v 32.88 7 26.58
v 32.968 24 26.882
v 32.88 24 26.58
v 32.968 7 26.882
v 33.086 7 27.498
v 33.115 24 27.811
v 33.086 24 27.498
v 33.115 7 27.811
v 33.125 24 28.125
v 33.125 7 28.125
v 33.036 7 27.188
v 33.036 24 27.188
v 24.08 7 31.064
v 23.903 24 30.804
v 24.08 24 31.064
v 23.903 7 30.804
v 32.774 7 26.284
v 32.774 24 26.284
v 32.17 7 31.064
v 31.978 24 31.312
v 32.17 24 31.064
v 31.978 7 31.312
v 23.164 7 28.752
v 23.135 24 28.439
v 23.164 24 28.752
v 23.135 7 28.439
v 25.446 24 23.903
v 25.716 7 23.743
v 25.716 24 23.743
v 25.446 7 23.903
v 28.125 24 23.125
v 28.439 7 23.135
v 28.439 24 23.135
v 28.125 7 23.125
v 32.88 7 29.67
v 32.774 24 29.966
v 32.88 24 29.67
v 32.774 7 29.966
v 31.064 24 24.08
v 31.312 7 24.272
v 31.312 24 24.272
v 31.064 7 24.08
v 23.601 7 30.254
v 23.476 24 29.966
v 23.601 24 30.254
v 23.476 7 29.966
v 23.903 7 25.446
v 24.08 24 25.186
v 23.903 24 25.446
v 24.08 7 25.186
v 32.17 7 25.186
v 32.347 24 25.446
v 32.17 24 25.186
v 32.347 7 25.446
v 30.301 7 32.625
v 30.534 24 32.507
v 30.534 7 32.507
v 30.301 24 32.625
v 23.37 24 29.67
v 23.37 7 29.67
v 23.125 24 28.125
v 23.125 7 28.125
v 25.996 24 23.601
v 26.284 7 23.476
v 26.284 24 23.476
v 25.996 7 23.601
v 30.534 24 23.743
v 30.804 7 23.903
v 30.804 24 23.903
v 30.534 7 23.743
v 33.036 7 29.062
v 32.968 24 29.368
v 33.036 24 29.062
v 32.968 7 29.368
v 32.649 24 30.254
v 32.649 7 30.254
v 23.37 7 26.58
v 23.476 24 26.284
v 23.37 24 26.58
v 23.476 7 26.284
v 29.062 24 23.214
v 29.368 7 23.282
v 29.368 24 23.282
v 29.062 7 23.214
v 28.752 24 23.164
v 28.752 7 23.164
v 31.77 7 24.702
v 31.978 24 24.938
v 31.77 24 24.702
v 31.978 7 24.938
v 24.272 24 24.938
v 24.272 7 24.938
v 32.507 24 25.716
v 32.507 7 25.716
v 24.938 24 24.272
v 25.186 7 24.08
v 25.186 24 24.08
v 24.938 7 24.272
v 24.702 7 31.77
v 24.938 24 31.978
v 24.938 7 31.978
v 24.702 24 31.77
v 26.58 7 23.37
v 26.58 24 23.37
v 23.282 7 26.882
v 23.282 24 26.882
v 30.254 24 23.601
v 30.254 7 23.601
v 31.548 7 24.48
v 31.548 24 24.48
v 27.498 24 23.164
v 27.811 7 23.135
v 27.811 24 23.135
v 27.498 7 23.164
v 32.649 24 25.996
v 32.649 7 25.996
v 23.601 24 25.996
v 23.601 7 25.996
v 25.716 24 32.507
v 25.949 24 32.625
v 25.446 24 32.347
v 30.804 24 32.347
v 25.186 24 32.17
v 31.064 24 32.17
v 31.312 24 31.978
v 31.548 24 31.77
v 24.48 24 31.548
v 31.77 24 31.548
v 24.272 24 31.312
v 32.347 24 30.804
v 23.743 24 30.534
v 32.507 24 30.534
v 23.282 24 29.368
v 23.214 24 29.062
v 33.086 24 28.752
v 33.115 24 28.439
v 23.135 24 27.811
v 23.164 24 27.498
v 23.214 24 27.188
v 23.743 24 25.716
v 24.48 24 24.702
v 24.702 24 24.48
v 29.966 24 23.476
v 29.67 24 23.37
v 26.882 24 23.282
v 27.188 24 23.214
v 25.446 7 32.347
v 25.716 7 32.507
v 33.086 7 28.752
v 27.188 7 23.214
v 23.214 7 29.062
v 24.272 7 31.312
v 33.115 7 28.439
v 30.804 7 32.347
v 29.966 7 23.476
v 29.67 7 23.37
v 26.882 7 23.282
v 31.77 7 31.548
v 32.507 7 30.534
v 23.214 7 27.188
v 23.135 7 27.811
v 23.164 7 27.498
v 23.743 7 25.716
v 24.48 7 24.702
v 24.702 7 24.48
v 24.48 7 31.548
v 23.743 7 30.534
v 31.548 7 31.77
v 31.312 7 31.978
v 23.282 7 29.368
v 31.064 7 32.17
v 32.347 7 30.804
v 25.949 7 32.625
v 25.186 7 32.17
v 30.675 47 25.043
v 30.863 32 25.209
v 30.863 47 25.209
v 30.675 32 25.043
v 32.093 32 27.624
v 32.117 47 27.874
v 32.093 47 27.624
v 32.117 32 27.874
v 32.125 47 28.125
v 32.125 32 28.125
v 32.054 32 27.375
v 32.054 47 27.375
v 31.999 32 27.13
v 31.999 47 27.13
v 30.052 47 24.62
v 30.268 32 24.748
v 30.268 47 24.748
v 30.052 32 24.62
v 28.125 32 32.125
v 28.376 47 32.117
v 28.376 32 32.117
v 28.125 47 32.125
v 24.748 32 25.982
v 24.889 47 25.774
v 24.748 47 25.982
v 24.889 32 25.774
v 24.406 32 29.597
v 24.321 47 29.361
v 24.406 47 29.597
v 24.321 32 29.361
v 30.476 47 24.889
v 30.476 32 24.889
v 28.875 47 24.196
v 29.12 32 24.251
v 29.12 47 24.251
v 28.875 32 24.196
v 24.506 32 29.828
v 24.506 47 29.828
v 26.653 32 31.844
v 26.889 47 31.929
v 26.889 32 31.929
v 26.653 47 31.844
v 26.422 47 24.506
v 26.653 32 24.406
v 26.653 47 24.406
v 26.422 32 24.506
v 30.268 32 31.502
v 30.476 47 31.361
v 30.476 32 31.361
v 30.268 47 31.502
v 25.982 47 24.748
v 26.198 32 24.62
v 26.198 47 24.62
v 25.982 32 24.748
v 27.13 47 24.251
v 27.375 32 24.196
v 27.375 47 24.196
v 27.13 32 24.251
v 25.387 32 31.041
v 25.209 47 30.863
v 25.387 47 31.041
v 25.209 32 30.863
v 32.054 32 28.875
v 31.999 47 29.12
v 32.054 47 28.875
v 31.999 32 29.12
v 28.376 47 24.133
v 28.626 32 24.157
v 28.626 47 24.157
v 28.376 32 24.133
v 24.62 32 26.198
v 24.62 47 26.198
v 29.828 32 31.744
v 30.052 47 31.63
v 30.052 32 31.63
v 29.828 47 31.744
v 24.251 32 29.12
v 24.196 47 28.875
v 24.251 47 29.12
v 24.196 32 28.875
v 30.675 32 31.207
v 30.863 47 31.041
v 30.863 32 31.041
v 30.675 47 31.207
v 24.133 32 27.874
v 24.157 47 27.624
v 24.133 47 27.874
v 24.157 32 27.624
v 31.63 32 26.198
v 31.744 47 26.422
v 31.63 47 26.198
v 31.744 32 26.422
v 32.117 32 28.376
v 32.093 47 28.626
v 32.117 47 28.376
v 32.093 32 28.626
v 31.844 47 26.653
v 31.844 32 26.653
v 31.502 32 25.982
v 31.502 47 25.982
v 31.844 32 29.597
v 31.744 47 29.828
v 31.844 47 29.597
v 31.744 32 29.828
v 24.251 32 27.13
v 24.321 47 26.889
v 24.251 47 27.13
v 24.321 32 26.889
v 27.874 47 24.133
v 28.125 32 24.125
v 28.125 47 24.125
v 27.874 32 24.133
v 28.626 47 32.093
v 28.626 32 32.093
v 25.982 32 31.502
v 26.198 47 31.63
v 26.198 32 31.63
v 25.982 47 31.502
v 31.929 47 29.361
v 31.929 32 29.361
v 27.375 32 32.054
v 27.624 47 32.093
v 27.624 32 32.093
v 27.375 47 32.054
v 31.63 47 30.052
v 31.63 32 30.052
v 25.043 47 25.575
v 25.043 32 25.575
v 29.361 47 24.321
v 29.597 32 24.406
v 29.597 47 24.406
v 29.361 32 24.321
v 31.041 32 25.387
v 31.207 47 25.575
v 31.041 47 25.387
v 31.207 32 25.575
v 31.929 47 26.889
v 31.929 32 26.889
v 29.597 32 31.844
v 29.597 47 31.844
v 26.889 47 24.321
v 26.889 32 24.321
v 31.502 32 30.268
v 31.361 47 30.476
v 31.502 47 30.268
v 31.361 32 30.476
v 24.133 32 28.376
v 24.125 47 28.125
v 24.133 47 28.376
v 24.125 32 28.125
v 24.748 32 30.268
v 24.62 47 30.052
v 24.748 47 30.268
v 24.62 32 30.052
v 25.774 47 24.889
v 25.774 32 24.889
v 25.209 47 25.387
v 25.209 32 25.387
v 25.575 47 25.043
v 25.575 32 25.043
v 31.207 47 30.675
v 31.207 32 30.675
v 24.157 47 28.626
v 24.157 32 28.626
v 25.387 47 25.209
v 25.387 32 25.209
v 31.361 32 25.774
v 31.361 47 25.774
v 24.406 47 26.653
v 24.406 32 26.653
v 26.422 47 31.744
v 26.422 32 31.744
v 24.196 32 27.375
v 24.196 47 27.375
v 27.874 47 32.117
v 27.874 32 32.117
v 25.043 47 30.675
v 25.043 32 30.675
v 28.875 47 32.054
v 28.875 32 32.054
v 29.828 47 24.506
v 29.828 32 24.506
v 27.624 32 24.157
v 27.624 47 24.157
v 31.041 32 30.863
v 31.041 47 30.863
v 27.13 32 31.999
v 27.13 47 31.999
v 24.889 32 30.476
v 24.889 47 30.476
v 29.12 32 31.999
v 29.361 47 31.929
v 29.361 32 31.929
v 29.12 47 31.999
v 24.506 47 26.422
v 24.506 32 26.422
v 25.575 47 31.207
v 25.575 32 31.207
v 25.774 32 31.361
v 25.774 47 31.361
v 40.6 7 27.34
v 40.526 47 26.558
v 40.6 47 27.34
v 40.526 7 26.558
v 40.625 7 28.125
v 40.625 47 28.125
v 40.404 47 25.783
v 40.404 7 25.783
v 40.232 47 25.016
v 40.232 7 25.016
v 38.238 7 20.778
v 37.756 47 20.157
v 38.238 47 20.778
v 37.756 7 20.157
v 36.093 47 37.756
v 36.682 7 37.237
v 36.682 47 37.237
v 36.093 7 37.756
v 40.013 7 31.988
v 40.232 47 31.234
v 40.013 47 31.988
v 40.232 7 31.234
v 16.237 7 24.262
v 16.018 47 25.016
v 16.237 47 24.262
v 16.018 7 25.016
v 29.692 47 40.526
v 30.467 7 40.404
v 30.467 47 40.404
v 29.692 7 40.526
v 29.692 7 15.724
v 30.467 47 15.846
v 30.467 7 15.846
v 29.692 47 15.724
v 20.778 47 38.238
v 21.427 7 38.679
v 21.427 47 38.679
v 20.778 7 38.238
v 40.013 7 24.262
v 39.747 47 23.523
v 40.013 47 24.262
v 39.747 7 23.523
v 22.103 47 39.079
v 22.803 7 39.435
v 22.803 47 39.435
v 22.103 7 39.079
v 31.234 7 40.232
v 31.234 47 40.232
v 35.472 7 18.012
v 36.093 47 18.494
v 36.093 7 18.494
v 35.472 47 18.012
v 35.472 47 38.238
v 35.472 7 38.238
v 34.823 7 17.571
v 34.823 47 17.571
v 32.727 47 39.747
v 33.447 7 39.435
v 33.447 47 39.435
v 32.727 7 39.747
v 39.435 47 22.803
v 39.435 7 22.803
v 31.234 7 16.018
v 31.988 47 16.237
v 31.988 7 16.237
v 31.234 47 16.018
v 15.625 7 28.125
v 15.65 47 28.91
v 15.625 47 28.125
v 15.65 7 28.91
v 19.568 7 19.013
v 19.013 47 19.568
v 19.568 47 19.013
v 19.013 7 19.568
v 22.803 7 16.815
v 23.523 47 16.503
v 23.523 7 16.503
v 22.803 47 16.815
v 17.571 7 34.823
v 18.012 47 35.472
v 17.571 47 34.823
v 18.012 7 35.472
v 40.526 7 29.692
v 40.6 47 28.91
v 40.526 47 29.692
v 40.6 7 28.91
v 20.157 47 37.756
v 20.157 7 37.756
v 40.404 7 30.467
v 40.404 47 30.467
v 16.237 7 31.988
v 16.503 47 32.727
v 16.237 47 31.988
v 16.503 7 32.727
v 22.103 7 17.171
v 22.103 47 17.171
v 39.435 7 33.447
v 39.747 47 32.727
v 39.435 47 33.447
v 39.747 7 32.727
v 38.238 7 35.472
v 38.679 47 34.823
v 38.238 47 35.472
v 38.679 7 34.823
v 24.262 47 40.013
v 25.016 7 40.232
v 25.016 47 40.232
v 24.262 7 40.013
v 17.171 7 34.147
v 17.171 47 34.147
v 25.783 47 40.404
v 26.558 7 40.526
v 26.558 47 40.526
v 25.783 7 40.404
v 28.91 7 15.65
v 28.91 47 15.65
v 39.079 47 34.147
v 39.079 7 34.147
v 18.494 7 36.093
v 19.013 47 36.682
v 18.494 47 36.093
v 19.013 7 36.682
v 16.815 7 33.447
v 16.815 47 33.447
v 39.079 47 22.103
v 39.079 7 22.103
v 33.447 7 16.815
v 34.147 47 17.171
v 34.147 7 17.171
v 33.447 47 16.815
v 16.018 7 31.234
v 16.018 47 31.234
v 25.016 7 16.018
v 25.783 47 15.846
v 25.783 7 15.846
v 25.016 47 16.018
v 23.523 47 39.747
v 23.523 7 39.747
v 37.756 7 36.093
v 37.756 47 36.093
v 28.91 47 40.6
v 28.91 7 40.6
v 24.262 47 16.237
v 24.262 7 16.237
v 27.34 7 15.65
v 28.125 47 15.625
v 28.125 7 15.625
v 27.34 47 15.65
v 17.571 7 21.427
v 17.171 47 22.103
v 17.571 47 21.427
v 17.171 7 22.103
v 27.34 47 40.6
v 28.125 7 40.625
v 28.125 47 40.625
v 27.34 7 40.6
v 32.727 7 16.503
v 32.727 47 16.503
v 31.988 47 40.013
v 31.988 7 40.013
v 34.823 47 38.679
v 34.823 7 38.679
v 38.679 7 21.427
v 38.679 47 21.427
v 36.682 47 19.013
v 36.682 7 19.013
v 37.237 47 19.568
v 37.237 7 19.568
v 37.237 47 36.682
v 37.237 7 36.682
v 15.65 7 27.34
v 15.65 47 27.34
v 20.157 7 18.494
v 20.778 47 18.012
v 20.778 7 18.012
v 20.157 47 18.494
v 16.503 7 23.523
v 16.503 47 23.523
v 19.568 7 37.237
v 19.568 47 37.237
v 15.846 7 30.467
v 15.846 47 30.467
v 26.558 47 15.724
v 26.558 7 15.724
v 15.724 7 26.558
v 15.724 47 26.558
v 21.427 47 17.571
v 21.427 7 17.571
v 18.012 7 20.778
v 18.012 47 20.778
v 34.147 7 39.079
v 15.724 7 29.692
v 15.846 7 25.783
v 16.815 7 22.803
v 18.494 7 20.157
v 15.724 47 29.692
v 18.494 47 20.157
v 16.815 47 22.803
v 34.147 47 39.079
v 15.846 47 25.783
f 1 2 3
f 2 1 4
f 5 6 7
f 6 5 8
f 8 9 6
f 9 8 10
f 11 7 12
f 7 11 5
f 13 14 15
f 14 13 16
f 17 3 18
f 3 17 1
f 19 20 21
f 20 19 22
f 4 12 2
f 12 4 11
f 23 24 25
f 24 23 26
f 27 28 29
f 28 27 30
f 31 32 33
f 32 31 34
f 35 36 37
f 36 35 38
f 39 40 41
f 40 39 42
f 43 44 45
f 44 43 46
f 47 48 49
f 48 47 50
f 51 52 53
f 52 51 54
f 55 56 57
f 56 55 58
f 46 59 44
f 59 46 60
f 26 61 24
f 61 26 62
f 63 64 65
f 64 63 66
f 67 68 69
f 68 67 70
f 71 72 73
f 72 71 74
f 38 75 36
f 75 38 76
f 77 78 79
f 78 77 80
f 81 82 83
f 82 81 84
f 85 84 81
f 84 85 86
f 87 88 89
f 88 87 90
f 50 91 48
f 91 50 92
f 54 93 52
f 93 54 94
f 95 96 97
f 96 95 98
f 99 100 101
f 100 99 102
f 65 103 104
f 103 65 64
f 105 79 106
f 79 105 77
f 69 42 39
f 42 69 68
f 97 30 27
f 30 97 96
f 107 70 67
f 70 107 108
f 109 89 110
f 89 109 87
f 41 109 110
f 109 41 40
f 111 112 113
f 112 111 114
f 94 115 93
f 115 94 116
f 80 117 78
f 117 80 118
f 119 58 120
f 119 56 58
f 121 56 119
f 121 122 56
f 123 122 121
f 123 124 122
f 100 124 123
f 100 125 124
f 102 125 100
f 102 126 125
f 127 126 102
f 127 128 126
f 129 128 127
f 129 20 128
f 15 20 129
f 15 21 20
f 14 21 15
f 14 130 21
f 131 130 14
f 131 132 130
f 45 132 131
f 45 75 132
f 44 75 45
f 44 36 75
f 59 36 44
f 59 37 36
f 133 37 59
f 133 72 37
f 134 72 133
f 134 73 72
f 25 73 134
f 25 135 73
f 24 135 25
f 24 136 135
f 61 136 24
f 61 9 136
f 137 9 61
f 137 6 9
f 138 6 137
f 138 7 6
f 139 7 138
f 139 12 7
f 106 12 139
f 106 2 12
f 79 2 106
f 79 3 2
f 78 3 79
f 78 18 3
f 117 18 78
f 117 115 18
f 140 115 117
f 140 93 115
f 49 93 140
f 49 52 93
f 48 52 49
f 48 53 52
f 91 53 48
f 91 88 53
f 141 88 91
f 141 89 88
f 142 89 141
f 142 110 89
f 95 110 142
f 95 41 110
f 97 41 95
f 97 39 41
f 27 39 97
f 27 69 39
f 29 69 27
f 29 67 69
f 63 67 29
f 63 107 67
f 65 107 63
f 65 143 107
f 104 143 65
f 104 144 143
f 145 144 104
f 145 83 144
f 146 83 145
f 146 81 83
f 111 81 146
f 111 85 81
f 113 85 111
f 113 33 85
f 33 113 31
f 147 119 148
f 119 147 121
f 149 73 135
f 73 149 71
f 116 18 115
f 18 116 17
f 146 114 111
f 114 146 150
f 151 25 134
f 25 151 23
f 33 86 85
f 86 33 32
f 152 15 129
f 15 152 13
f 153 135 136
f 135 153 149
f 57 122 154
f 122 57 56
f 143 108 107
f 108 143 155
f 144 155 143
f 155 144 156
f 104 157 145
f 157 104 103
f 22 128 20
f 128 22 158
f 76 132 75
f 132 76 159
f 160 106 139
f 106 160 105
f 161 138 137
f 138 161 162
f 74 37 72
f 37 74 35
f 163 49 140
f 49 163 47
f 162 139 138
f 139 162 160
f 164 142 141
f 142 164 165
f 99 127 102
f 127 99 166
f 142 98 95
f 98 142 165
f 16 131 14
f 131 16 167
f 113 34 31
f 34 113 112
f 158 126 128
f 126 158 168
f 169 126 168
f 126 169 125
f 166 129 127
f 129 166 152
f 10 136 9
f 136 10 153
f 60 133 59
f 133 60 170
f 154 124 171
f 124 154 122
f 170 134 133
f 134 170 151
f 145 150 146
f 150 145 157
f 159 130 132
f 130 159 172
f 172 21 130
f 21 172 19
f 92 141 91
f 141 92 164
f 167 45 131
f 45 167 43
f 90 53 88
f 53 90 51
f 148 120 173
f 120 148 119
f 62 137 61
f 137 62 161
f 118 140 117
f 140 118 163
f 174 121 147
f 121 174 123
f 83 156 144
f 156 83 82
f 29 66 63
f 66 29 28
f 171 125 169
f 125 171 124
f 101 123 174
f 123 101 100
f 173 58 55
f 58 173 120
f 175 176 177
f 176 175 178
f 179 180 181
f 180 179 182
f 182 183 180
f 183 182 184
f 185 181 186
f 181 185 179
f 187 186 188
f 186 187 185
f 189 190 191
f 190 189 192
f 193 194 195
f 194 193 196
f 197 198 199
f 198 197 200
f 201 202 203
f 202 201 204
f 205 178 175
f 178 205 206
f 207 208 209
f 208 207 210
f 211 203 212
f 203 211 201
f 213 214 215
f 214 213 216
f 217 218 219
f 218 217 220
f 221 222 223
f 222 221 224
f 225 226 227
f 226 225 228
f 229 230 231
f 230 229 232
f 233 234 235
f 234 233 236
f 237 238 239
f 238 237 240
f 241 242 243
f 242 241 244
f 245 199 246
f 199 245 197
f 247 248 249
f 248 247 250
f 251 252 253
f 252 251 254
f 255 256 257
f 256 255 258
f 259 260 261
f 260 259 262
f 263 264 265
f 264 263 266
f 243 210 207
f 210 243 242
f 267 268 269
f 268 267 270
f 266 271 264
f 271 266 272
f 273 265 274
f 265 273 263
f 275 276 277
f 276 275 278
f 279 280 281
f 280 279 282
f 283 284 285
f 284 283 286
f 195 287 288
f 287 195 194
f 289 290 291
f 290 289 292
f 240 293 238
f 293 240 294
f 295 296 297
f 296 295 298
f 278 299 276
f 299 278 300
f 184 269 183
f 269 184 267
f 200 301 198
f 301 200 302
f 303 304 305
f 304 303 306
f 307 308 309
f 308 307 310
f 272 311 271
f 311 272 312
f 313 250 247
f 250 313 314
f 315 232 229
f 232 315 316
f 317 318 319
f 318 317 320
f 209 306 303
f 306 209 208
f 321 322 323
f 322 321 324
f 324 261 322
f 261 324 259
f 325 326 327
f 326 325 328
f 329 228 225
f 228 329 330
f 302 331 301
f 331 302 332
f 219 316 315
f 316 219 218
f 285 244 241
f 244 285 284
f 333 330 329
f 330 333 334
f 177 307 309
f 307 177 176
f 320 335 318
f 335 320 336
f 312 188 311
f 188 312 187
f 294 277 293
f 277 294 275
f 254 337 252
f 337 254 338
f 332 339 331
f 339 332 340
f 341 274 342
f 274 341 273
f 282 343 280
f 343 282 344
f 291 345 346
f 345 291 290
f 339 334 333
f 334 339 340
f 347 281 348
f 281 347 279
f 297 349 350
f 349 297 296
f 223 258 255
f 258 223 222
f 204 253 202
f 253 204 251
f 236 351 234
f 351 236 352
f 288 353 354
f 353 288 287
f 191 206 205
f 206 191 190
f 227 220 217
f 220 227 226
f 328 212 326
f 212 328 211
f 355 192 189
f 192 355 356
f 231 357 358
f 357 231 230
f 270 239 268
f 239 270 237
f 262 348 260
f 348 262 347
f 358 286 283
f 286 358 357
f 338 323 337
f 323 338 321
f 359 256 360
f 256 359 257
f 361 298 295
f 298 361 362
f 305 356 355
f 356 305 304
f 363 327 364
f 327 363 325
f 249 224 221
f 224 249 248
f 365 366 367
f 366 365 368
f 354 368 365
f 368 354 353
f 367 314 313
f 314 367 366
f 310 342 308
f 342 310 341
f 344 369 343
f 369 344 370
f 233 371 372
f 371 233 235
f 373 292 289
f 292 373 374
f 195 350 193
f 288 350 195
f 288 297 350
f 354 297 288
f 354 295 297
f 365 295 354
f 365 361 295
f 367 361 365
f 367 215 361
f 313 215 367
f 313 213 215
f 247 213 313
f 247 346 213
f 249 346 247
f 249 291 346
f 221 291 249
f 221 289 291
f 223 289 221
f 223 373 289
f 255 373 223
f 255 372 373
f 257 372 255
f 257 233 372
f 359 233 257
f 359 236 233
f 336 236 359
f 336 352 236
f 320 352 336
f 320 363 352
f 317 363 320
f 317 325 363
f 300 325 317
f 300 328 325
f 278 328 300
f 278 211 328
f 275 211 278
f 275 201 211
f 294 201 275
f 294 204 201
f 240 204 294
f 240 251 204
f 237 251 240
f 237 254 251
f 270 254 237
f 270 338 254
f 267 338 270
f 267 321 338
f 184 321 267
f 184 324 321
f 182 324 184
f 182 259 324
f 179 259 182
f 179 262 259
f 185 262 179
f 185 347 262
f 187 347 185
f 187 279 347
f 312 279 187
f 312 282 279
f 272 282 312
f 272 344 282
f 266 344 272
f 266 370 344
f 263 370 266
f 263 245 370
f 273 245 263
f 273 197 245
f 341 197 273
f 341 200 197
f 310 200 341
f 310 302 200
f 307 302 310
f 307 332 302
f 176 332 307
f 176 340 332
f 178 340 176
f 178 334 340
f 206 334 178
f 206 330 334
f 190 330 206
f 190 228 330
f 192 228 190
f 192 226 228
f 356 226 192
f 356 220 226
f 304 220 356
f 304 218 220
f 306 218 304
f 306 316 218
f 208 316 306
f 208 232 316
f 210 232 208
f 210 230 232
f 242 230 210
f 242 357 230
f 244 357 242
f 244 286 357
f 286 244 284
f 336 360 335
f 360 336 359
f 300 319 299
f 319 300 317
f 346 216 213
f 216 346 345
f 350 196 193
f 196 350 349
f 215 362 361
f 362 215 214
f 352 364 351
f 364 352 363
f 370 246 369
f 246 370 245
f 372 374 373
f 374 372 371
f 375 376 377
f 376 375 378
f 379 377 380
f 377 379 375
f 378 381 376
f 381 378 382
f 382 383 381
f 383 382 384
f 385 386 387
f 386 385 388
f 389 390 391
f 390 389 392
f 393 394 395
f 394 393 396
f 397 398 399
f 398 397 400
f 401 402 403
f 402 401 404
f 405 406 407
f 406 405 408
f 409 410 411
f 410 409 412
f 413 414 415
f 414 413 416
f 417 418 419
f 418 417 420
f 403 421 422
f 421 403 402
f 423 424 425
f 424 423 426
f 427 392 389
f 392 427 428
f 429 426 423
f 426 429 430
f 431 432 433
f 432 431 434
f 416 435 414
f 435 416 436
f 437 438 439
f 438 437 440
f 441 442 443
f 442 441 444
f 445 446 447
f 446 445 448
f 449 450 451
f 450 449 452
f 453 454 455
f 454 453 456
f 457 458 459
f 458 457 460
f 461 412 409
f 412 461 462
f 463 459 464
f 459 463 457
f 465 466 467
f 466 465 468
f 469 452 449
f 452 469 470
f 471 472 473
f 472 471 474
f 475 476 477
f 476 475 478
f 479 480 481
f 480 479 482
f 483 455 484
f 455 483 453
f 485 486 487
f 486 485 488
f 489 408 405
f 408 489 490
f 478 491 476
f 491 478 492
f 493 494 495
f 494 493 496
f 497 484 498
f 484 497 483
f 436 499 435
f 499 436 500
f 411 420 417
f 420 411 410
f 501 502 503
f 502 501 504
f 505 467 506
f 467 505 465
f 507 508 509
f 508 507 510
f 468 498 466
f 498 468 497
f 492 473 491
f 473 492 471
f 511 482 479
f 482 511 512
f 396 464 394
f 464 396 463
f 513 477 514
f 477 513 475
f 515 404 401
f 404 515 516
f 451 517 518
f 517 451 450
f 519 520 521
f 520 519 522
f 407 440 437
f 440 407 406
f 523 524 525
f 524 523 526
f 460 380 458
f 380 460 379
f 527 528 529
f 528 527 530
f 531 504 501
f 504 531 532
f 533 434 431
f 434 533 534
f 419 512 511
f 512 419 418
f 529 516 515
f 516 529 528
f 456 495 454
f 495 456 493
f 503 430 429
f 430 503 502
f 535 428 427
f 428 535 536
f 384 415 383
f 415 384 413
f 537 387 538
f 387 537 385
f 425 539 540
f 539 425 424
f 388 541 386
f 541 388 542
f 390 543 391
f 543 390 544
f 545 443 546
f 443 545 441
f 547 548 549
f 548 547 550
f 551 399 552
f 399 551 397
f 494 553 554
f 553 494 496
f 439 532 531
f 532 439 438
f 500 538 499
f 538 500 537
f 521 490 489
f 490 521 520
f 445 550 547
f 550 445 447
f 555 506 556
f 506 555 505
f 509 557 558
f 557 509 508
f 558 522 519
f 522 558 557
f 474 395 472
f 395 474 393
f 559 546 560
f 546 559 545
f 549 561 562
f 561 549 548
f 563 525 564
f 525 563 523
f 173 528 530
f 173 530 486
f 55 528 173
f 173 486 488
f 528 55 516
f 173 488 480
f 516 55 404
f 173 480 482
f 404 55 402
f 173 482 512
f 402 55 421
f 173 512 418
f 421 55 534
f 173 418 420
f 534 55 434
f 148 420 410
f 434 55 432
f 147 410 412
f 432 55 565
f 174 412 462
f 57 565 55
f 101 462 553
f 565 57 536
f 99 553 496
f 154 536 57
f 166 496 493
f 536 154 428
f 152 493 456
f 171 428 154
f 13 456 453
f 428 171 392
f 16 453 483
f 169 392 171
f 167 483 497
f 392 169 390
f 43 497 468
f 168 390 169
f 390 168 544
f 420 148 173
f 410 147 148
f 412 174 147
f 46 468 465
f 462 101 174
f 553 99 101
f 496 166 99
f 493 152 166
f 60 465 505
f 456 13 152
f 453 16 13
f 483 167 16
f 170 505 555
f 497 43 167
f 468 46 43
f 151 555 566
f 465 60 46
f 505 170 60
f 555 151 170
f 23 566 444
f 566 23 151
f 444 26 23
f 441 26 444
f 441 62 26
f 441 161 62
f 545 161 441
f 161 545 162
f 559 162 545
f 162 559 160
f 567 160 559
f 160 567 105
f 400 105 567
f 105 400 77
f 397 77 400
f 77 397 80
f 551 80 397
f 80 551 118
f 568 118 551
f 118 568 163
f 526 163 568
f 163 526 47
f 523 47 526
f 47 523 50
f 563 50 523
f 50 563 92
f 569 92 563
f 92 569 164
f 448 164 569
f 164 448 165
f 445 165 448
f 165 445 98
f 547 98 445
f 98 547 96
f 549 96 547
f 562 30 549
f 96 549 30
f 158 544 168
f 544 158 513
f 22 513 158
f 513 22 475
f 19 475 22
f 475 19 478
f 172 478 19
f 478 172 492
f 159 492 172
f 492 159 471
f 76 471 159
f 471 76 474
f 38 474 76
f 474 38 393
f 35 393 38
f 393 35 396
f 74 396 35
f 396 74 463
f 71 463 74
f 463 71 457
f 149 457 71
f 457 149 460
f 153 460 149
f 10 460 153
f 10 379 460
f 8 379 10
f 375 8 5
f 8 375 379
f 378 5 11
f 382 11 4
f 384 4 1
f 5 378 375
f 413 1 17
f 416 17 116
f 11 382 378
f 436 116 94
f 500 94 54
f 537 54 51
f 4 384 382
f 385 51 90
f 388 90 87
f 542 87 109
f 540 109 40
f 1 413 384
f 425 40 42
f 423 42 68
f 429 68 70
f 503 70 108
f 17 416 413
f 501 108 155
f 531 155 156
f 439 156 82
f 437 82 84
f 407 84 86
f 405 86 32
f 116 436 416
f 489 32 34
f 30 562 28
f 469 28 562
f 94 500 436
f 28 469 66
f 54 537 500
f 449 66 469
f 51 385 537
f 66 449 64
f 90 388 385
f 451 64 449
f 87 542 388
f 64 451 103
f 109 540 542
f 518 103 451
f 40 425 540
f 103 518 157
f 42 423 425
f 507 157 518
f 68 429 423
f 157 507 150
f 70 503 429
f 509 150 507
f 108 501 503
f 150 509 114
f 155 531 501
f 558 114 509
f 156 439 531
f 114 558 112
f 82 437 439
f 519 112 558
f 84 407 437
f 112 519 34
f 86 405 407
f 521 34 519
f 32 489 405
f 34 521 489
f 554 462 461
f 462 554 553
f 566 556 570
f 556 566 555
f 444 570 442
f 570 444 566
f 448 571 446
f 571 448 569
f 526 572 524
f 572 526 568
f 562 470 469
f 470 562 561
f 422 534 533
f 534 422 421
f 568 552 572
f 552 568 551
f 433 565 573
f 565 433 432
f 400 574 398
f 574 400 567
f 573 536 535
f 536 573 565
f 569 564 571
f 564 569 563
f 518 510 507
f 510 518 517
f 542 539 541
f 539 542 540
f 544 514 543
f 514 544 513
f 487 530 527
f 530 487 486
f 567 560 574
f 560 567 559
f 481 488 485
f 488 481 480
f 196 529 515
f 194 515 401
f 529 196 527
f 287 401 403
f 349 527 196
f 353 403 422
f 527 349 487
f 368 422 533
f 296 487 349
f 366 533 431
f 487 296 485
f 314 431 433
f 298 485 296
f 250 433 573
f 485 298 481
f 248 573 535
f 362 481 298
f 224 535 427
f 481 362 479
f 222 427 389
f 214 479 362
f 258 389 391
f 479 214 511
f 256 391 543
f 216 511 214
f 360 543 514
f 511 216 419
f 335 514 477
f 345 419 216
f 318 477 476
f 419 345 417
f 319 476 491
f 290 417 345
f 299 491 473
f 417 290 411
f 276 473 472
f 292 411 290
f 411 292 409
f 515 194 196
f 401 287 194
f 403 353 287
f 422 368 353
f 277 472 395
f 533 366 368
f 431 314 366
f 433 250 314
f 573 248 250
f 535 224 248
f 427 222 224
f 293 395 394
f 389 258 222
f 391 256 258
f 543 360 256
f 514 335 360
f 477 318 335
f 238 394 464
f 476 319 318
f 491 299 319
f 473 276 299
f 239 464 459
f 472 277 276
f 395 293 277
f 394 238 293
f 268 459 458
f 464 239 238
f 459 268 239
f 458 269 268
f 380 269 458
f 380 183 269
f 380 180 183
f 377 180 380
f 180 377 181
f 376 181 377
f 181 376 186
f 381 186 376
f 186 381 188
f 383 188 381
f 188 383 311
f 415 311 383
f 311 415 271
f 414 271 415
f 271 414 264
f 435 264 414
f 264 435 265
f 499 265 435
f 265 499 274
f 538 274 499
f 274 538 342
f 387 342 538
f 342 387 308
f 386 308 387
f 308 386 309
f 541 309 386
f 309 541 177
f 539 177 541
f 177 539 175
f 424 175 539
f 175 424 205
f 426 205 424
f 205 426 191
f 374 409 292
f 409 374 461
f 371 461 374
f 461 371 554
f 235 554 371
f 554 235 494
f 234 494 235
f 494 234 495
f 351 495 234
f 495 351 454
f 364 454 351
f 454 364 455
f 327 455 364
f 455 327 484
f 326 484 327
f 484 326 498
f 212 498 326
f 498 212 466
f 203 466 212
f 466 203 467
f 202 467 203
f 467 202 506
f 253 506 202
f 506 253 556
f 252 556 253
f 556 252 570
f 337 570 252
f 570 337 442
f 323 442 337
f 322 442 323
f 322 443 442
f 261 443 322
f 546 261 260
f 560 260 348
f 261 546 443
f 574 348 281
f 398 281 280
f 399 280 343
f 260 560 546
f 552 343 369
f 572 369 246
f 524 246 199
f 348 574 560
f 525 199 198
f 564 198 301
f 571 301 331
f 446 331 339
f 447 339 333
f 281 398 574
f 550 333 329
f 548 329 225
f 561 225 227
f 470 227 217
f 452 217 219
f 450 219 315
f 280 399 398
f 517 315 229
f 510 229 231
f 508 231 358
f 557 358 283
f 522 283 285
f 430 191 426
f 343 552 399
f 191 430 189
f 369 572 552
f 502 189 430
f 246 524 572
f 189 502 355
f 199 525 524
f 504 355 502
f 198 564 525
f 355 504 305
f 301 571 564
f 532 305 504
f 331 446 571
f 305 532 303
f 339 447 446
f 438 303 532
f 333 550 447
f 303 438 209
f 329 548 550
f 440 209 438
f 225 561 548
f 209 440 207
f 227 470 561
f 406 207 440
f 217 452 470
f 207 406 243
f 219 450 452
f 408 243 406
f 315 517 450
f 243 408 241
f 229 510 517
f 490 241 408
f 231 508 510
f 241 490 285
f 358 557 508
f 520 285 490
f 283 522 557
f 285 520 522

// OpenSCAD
// file: ../helper/motor.scad
include <../helper/bom.scad>

/*
  Author: Johannes Bayer, 2025
  License: MIT
  Description: NEMA 23 Stepper Motor
*/


MOTOR_BLOCK_WIDTH = 56.25;
MOTOR_BLOCK_HEIGHT = 56.25;
MOTOR_BLOCK_LENGTH = 112.0;
MOTOR_CON_DIA = 38.1;
MOTOR_CON_LEN = 1.5;
MOTOR_SHAFT_DIA = 10;
MOTOR_SHAFT_LEN = 22.5;
MOTOR_SHAFT_CUT_DIA = 9.5;
MOTOR_SHAFT_CUT_LEN = 20.0;

module motor(){

    bom_item("NEMA_23_STEPPER_MOTOR");

    color([0.8,0.15,0.15])
        difference(){
            
            union(){
                translate([0,-MOTOR_BLOCK_LENGTH,0])
                    cube([MOTOR_BLOCK_WIDTH,MOTOR_BLOCK_LENGTH,MOTOR_BLOCK_HEIGHT]);

                translate([MOTOR_BLOCK_WIDTH/2,0,MOTOR_BLOCK_HEIGHT/2])
                    rotate([-90,0,0])
                        union(){
                            cylinder(h=MOTOR_CON_LEN,d=MOTOR_CON_DIA);
                            cylinder(h=MOTOR_SHAFT_LEN+MOTOR_CON_LEN,
                                     d=MOTOR_SHAFT_DIA);
                        }
            }

            translate([MOTOR_BLOCK_WIDTH/2-MOTOR_SHAFT_DIA/2,
                       MOTOR_SHAFT_LEN+MOTOR_CON_LEN-MOTOR_SHAFT_CUT_LEN,
                       MOTOR_BLOCK_HEIGHT/2+MOTOR_SHAFT_DIA/2-MOTOR_SHAFT_DIA+MOTOR_SHAFT_CUT_DIA])
                cube([MOTOR_SHAFT_DIA,MOTOR_SHAFT_CUT_LEN,MOTOR_SHAFT_DIA]);

        }

};

// Sample Usage
// motor($fn=400);
// file: ../helper/bom.scad
/*
  Author: Johannes Bayer, 2025
  License: MIT
  Description: Helper Function to generate the Bill of Material (BOM) automatically
*/


module bom_item(component_name, mod_type="",mod_val=0){

    echo(str("BOM_ITEM: ", component_name, ", ", mod_type, ", ", mod_val));

}


// Sample Usage
//bom_item("Motor");
//bom_item("T-SLOT 45x2", "length", "300");
// main file
include <../helper/bom.scad>
include <../helper/motor.scad>


THEADED_ROD_DIA_OUTER = 8.0;
THEADED_ROD_LEN_ATTACH = 16.0;
THEADED_ROD_MOTOR_DIST = 8.0;



module motor_coupling(){

    bom_item("MOTOR_COUPLING");

    difference(){
        translate([MOTOR_BLOCK_WIDTH/2,
                       MOTOR_CON_LEN+MOTOR_SHAFT_LEN+THEADED_ROD_MOTOR_DIST-25,
                       MOTOR_BLOCK_HEIGHT/2])
            rotate([-90,0,0])
                cylinder(h=40,d=25);
        union(){
            motor();
            translate([MOTOR_BLOCK_WIDTH/2,
                       MOTOR_CON_LEN+MOTOR_SHAFT_LEN+THEADED_ROD_MOTOR_DIST,
                       MOTOR_BLOCK_HEIGHT/2])
                rotate([-90,0,0])
                    cylinder(h=THEADED_ROD_LEN_ATTACH, d=THEADED_ROD_DIA_OUTER);
        }
    }

}


motor_coupling($fn=100);
